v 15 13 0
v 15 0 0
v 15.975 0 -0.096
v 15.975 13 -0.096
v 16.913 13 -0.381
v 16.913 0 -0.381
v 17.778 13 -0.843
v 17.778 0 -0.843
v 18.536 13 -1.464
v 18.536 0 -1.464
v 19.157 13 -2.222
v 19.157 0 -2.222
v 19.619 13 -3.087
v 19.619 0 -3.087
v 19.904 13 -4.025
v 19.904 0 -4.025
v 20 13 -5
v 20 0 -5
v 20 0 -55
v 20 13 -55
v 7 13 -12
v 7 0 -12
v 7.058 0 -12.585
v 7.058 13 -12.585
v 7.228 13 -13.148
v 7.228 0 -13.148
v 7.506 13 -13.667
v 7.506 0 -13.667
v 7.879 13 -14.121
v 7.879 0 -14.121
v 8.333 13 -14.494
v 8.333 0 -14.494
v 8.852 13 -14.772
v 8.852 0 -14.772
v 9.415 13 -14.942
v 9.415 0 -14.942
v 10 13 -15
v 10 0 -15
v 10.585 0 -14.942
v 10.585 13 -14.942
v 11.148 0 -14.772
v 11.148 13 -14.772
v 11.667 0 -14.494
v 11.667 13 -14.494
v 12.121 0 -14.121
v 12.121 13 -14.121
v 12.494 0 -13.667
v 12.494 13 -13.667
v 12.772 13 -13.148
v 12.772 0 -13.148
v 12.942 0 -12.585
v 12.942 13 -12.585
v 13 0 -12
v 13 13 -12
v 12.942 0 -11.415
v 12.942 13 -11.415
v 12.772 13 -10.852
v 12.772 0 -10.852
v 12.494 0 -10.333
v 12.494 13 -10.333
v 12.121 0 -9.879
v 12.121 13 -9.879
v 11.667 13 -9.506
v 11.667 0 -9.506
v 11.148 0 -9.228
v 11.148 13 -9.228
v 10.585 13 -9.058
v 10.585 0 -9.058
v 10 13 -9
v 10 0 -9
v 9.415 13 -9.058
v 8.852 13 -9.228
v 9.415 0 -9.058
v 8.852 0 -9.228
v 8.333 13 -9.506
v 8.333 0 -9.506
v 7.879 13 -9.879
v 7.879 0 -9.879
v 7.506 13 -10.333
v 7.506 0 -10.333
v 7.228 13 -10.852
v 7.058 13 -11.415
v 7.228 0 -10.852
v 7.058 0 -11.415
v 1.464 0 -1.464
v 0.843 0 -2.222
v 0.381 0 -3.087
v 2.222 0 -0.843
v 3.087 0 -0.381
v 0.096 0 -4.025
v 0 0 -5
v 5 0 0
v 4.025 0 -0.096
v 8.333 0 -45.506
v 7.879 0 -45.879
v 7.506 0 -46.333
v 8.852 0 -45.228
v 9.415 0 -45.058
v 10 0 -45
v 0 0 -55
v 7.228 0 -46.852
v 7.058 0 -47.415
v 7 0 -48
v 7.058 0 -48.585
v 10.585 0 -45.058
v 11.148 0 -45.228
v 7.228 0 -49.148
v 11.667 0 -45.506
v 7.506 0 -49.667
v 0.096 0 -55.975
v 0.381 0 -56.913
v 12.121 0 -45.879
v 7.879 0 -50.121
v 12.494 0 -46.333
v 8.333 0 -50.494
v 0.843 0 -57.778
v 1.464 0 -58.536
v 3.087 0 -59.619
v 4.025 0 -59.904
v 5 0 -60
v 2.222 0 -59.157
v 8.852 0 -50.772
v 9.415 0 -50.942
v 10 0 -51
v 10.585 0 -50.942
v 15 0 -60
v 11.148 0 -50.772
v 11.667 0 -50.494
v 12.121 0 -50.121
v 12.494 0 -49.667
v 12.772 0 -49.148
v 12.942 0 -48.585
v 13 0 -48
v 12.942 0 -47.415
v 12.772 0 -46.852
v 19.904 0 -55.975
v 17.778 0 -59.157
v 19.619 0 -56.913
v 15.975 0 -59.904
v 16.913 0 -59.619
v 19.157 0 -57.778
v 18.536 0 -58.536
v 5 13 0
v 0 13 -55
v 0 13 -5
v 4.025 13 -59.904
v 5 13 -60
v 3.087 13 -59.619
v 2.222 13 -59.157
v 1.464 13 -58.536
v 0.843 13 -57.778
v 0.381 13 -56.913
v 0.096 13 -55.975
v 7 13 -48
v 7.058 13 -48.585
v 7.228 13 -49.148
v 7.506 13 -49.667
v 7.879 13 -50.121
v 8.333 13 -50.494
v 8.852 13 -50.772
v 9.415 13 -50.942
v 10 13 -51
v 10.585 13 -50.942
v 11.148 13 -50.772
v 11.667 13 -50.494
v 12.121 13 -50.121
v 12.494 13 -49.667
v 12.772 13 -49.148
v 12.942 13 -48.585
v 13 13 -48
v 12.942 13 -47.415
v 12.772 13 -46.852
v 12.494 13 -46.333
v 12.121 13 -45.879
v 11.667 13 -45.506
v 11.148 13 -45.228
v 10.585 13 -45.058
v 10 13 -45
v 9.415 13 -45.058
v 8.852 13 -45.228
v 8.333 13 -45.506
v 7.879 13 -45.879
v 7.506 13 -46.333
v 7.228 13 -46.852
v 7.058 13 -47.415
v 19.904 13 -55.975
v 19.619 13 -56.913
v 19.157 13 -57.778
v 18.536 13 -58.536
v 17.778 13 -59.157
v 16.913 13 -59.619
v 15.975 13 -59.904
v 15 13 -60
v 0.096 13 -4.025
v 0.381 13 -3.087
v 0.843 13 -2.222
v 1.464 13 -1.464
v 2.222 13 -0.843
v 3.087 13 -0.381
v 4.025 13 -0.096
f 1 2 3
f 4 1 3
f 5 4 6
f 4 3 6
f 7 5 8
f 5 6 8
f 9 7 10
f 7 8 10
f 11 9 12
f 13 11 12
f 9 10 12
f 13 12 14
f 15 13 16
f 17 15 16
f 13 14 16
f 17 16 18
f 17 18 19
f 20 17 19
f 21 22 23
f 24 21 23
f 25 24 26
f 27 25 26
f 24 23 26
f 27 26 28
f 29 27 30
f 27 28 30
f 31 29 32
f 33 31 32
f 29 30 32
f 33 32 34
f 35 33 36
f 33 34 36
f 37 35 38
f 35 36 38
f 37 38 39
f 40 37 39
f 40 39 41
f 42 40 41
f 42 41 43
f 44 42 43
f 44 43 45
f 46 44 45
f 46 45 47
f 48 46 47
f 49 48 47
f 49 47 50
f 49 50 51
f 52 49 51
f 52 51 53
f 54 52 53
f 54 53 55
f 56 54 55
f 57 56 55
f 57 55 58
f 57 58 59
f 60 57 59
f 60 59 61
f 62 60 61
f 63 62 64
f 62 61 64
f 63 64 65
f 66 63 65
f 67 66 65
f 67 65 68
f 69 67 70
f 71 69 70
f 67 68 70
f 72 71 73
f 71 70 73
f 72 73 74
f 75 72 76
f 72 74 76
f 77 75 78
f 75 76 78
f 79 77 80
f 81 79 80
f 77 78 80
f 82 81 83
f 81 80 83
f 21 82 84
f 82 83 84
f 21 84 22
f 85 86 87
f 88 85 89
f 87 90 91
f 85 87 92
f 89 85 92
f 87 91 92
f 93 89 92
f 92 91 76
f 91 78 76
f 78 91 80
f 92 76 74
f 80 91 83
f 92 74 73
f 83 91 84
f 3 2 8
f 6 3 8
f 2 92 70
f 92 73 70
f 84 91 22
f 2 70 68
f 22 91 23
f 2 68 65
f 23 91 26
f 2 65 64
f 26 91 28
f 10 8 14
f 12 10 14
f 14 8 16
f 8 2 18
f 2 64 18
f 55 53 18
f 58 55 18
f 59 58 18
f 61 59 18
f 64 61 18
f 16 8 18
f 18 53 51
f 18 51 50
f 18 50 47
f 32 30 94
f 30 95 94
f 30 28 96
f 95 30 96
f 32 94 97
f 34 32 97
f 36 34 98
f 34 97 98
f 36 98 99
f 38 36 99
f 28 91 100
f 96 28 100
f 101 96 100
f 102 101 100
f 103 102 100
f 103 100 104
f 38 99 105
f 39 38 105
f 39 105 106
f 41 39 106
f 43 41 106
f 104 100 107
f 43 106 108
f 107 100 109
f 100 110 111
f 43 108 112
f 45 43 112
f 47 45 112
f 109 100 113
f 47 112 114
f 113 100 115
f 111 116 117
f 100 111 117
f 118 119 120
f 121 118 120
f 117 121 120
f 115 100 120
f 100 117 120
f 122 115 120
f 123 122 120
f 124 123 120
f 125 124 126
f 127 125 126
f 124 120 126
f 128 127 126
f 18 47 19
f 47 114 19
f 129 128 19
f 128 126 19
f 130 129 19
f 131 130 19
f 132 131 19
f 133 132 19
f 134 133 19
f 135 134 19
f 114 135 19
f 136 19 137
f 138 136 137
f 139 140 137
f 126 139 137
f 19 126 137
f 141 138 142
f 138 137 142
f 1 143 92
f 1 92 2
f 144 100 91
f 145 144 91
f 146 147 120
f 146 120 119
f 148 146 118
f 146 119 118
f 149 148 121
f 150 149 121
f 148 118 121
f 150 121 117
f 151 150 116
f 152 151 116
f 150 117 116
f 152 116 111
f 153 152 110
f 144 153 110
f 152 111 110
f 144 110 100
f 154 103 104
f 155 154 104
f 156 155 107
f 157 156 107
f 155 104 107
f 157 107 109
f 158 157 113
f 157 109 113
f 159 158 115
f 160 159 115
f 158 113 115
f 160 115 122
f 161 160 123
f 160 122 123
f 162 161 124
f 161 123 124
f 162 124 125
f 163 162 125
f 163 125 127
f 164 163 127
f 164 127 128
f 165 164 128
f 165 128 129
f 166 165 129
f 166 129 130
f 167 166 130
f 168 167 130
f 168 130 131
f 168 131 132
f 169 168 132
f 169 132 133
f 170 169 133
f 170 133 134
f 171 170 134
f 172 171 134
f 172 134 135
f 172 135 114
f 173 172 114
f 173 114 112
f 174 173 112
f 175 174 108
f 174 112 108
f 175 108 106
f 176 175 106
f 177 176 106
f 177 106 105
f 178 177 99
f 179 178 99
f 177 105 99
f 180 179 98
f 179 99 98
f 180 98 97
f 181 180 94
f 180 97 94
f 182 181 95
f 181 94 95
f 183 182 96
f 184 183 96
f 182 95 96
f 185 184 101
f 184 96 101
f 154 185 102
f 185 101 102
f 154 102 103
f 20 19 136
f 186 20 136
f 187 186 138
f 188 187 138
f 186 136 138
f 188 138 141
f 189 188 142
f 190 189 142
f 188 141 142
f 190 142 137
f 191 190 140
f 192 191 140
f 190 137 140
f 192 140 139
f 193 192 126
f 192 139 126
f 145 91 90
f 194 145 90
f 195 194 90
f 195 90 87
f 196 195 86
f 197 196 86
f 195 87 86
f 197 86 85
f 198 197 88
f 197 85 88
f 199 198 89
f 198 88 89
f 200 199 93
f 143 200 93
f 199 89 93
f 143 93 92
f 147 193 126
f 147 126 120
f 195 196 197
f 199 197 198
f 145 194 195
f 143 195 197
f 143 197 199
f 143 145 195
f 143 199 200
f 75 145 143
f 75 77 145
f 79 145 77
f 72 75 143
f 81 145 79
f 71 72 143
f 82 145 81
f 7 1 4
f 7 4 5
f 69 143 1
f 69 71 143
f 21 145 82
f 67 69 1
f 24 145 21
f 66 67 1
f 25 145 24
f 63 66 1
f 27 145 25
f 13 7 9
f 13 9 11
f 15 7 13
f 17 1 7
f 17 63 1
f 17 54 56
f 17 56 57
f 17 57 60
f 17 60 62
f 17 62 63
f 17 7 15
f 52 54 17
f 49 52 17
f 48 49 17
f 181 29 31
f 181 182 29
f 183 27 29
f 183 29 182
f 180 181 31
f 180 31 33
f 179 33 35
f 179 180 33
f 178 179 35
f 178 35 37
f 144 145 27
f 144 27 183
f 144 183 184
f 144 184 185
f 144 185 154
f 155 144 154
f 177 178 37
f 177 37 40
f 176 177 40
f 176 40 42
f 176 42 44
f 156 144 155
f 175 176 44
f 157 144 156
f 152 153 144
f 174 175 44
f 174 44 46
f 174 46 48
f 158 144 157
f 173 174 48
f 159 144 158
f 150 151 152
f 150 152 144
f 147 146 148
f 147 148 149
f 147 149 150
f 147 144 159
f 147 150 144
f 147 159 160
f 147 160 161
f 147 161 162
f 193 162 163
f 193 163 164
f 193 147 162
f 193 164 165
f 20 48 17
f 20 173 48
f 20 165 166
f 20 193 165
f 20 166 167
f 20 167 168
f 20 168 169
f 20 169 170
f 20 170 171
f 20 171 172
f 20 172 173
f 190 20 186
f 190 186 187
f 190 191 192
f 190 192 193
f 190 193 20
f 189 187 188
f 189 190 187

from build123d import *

# Parameters (mm, degrees)
BOSS_EXTRUDE1_DEPTH   = 13
F_6_0MM_DOWEL_HOLE1_D = 6


with BuildPart() as part:
    # Sketch1 → Boss-Extrude1 (new body)
    with BuildSketch(Plane(origin=(0, 0, 0), x_dir=(1, 0, 0), z_dir=(0, 1, 0))):
        with BuildLine():
            Line((5, 0), (15, 0))
            ThreePointArc((15, 0), (18.535533906, 1.464466094), (20, 5))
            Line((20, 5), (20, 55))
            ThreePointArc((20, 55), (18.535533906, 58.535533906), (15, 60))
            Line((15, 60), (5, 60))
            ThreePointArc((5, 60), (1.464466094, 58.535533906), (0, 55))
            Line((0, 55), (0, 5))
            ThreePointArc((0, 5), (1.464466094, 1.464466094), (5, 0))
        make_face()
    extrude(amount=BOSS_EXTRUDE1_DEPTH)

    # Ø6.0mm Dowel Hole1 (through all)
    with Locations(Plane(origin=(0, 13, 0), x_dir=(1, 0, 0), z_dir=(0, 1, 0))):
        with Locations((10, 12), (10, 48)):
            Hole(F_6_0MM_DOWEL_HOLE1_D / 2)


solid = part.part
